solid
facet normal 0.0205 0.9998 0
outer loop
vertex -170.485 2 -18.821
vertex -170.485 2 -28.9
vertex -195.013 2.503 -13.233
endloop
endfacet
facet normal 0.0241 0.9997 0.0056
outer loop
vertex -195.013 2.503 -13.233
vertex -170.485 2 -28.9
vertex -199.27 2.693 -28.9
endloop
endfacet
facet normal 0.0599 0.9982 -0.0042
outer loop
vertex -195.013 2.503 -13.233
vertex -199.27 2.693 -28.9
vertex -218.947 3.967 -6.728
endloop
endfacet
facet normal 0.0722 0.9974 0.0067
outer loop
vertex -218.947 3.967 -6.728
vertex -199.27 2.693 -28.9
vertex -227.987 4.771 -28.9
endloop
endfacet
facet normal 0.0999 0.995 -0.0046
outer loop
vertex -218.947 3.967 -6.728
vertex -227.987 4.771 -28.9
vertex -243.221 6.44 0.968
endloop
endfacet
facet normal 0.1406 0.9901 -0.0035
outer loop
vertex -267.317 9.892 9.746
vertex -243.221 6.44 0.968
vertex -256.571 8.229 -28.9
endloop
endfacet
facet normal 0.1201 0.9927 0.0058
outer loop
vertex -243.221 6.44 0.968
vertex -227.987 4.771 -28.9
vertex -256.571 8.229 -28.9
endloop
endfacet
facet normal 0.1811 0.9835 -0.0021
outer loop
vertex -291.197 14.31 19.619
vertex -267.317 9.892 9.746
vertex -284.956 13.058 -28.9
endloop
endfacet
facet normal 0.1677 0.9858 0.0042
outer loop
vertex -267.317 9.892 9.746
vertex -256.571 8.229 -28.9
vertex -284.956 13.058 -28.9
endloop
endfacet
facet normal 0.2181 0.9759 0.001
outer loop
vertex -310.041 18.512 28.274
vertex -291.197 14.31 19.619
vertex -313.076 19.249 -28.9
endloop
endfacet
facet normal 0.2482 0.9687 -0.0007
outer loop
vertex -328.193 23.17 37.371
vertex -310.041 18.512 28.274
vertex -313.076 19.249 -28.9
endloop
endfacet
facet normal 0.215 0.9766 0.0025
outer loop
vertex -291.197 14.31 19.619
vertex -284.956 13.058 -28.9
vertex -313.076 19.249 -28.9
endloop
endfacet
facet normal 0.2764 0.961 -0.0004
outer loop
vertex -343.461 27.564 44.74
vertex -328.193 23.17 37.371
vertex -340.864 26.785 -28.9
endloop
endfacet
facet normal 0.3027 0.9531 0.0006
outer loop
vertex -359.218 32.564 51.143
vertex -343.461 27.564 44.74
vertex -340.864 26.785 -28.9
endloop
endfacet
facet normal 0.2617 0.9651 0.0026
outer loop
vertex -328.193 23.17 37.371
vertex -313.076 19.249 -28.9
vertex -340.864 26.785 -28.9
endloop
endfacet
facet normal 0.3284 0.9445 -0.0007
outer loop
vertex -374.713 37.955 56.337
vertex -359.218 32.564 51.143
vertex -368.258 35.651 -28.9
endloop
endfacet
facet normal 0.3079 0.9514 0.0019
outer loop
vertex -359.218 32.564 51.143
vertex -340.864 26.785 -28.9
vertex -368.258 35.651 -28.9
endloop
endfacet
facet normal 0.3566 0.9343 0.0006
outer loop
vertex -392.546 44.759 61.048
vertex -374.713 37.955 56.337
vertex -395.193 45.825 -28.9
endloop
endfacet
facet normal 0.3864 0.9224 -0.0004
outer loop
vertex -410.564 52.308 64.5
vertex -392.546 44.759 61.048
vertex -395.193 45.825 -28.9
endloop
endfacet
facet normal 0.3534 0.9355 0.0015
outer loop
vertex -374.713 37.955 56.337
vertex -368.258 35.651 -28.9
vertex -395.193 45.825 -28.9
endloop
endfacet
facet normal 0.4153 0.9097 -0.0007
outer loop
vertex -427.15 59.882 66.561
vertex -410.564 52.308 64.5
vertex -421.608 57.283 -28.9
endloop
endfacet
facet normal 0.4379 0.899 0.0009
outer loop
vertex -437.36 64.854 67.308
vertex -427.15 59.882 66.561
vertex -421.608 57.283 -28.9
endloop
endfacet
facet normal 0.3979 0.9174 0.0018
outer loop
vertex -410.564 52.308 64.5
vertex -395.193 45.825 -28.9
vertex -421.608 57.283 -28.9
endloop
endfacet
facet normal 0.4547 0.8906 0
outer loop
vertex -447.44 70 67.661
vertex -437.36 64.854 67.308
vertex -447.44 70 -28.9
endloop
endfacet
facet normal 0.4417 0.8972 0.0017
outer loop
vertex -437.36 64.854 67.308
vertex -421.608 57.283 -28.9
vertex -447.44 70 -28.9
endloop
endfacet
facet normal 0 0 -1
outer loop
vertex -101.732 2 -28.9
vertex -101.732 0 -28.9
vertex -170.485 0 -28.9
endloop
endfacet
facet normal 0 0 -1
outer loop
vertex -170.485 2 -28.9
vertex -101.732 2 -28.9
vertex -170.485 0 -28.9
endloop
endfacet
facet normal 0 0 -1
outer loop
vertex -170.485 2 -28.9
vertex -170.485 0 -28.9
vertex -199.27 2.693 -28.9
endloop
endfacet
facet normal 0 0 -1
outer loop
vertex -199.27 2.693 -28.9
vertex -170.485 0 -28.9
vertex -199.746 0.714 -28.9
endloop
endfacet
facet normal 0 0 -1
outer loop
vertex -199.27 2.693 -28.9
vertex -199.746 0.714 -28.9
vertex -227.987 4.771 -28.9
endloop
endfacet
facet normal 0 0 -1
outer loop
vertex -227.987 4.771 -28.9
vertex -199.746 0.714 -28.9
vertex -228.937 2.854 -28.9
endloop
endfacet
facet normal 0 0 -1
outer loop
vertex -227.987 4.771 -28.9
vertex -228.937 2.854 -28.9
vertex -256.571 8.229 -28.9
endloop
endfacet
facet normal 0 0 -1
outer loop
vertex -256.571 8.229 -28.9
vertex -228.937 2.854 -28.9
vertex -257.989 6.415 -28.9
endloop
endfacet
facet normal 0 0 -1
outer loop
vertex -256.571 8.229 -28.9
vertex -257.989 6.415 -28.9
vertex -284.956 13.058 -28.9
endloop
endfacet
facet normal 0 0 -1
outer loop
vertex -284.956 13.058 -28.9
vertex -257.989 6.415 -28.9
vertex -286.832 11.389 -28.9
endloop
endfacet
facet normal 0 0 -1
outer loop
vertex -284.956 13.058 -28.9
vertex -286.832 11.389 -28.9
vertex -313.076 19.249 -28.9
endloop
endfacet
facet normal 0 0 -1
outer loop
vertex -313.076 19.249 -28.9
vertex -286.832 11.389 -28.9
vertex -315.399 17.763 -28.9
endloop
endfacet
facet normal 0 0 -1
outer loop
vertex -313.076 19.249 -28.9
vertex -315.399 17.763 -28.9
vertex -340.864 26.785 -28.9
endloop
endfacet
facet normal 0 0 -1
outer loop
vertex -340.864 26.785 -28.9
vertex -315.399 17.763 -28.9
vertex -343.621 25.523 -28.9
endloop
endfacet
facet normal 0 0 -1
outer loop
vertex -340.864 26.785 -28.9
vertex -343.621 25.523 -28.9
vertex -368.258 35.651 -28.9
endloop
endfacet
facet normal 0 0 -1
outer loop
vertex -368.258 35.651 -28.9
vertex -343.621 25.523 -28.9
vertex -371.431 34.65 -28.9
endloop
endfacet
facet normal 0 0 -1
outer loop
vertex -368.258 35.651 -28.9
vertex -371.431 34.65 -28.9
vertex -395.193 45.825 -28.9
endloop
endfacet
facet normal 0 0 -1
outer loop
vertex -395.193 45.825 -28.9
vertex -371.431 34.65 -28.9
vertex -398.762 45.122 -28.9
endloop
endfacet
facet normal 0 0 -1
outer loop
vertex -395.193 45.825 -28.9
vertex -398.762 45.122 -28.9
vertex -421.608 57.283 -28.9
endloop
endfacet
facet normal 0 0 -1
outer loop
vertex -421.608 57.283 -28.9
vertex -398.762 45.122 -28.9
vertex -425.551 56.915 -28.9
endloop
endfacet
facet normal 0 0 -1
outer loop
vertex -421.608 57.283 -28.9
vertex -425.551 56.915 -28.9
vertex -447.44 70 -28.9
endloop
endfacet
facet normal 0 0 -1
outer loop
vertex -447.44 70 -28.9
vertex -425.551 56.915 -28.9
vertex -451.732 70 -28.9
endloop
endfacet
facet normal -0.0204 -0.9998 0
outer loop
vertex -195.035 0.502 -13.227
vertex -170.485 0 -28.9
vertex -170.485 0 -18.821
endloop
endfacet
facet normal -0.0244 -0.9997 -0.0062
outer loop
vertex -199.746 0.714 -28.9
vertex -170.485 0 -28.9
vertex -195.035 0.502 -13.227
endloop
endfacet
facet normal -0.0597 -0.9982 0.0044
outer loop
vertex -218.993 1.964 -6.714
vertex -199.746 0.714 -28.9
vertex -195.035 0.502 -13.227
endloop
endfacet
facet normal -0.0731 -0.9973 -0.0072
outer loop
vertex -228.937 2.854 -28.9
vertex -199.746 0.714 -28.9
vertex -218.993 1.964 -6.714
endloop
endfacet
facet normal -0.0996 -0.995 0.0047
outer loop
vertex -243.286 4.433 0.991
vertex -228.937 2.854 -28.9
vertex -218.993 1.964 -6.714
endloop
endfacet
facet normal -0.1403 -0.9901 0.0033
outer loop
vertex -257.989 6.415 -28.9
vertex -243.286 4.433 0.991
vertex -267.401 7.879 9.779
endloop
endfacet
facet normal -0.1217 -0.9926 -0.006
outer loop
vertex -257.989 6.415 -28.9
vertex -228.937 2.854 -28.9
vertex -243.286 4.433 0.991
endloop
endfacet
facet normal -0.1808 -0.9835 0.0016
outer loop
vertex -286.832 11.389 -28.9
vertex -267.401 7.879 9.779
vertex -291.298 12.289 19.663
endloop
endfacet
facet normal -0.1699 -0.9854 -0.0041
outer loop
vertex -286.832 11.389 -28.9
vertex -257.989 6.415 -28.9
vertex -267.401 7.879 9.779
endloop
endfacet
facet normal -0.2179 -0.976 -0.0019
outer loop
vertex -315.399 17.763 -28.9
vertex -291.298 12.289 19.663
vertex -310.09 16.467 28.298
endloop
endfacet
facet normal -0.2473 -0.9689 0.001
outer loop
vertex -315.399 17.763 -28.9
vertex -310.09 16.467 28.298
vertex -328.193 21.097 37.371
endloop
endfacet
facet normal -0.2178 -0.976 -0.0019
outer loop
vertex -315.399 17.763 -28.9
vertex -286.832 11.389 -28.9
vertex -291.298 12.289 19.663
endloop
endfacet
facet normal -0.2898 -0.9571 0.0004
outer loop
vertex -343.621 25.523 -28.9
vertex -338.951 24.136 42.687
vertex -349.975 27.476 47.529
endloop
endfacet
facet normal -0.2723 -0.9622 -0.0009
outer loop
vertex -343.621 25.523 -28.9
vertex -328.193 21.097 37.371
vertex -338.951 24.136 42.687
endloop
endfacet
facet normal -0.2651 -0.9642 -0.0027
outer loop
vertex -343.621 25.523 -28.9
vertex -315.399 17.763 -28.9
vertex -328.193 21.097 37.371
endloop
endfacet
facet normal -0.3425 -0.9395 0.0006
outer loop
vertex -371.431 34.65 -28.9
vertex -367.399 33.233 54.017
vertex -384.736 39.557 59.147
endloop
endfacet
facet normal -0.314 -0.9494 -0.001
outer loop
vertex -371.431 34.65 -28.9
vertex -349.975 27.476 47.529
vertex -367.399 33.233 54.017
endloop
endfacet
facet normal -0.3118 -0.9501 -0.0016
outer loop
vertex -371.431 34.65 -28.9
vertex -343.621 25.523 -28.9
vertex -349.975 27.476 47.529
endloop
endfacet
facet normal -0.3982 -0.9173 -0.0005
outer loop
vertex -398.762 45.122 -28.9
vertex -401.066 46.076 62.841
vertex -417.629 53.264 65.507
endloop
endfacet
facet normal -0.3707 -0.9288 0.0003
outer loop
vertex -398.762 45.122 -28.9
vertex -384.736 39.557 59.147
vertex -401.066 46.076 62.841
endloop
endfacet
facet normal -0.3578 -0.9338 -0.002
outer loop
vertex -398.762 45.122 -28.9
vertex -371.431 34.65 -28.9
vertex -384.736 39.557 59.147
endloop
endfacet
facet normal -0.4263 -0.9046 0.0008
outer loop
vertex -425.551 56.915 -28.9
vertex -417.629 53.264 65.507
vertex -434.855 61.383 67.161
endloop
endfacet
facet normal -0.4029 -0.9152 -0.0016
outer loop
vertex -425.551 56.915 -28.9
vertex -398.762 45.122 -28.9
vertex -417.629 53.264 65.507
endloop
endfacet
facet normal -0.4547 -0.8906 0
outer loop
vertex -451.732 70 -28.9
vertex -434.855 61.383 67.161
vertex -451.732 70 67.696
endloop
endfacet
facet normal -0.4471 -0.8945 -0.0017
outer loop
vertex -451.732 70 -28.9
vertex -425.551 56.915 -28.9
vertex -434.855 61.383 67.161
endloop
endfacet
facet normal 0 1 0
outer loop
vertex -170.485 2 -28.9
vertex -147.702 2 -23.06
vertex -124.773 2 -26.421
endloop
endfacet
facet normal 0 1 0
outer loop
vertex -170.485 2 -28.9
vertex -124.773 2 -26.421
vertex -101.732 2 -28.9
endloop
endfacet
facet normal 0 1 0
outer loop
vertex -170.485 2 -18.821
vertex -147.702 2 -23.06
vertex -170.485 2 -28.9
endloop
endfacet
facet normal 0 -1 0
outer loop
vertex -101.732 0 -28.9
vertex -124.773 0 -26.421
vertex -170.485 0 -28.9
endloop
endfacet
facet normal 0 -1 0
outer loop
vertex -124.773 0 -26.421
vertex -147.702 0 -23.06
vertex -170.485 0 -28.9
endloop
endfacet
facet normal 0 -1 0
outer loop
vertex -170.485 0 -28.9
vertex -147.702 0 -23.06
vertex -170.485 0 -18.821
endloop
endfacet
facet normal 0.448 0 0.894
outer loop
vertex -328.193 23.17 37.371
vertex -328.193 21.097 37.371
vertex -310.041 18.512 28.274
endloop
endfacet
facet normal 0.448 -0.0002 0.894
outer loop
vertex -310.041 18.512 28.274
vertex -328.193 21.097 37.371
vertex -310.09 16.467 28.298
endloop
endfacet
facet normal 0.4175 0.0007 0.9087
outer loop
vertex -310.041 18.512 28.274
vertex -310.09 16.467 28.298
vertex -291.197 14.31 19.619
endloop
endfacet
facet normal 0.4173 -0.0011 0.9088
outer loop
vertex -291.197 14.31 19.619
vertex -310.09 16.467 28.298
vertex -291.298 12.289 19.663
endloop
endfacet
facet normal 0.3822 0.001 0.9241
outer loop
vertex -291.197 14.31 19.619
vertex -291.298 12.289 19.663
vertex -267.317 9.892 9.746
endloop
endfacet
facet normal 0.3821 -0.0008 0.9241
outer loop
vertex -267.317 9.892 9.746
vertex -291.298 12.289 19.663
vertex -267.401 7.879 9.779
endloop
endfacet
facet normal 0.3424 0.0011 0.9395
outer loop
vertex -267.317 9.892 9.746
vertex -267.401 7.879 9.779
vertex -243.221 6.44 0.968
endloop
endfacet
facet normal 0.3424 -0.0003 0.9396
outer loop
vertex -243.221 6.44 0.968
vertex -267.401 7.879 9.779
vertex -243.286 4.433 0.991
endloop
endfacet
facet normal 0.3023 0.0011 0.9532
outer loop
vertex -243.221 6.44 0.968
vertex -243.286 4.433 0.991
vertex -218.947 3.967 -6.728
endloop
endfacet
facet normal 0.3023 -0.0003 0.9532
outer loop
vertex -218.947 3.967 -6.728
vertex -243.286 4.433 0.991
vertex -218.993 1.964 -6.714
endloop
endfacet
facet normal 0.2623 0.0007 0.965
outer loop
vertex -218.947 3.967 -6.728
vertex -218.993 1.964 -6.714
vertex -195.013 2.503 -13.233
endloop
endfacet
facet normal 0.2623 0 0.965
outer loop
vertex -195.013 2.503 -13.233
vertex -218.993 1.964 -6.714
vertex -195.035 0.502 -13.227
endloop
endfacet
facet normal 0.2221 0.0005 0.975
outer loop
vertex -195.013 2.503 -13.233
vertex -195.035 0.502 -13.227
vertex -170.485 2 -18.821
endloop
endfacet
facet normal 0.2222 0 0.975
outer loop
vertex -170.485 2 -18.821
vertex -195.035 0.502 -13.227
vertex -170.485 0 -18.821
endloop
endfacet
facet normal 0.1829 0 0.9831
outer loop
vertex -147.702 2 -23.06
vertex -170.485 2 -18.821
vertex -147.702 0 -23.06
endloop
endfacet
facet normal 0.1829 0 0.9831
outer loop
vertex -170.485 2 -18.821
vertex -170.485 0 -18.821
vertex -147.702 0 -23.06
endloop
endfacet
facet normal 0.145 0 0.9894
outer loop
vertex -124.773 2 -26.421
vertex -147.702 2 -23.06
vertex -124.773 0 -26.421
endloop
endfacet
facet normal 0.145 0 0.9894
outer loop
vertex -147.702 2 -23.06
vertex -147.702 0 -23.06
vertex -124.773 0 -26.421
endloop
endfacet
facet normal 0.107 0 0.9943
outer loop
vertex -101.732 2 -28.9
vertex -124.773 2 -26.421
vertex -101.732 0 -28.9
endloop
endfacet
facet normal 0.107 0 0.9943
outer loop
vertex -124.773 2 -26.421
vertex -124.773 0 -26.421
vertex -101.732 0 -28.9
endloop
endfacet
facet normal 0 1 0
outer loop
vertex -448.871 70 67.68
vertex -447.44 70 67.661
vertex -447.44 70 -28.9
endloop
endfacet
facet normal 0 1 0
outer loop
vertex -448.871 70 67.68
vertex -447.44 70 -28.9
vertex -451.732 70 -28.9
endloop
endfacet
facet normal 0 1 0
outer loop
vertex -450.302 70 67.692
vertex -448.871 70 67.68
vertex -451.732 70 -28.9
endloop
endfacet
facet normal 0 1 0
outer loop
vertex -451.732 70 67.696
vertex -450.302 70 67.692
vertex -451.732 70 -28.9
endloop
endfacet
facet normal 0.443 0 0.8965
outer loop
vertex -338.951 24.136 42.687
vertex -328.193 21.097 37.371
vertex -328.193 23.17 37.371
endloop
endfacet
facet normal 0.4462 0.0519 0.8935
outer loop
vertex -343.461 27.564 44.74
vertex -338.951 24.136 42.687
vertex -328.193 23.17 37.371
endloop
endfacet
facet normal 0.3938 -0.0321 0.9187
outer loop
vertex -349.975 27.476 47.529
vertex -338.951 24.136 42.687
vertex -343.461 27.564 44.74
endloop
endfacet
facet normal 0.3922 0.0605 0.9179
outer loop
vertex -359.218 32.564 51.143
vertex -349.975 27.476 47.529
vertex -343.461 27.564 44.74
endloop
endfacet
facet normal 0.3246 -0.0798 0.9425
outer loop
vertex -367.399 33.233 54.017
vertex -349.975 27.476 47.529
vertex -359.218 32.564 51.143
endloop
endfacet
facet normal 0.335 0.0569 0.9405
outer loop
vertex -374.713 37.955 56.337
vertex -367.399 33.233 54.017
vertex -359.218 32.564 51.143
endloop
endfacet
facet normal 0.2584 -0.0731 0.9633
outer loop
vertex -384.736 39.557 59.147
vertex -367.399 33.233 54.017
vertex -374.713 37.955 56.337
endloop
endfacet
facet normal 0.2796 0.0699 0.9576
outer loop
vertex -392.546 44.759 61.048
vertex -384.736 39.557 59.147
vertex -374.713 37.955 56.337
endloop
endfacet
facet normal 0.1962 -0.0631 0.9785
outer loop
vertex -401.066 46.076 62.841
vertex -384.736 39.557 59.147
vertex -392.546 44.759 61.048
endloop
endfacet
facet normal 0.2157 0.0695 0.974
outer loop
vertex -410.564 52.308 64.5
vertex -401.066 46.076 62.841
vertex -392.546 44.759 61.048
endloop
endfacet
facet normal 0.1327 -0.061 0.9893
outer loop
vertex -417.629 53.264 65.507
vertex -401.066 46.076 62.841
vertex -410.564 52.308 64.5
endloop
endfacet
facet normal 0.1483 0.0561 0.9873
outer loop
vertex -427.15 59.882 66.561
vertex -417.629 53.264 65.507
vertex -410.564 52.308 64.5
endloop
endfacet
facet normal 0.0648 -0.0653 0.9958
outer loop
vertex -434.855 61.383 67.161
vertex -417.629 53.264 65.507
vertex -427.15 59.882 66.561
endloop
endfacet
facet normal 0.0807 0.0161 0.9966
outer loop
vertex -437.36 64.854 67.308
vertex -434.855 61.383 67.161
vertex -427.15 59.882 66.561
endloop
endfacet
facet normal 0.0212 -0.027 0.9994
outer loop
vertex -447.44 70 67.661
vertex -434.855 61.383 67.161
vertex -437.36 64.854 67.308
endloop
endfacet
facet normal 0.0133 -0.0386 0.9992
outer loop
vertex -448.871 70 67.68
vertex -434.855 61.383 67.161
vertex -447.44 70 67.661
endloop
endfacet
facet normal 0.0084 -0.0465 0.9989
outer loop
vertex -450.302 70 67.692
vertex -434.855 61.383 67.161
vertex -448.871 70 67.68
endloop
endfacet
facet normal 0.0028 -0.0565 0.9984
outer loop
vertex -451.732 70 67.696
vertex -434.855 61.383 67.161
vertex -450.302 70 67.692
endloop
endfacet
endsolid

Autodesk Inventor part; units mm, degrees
ref_plane "YZ Plane" through (0, 0, 0) normal (1, 0, 0) x (0, 1, 0)
ref_plane "XZ Plane" through (0, 0, 0) normal (0, 1, 0) x (-1, 0, 0)
ref_plane "XY Plane" through (0, 0, 0) normal (0, 0, 1) x (1, 0, 0)
sketch "スケッチ1" plane through (0, 0, 0) normal (0, 1, 0) x (-1, 0, 0)
  line L0 (101.7324, -28.9004) -> (451.7324, -28.9004)
  line L1 (451.7324, -28.9004) -> (451.7324, 67.6956)
  arc A0 (451.7324, 67.6956) -> (328.1926, 37.3714) centre (451.7324, -199.1148) ccw
  arc A1 (101.7324, -28.9004) -> (328.1926, 37.3714) centre (48.6916, 572.4068) ccw
  dimension "d1" = 350
  dimension "d2" = 603.642
extrude "押し出し1" add sketch "スケッチ1" along normal blind 70
sketch "スケッチ2" plane through (-101.7324, 0, -28.9004) normal (0, 0, -1) x (-1, 0, 0)
  arc A0 (68.7528, 0) -> (350, 70) centre (68.7528, 600) ccw
  line L0 (350, 0) -> (0, 0) projected
  line L1 (350, 0) -> (350, 70) projected
  line L2 (0, 0) -> (0, 70) projected
  point P0 (-101.7324, 0)
  dimension "d9" = 600
extrude "押し出し2" cut sketch "スケッチ2" against normal through all
shell "シェル1" thickness 2 removed faces 4 at (-334.0598, 39.1147, 40.3449) at (-359.2071, 70, 10.3289) at (-150.6861, 46.6667, -22.5561) at (-325.356, 65.1801, -28.9004)
properties part number "splitter"
